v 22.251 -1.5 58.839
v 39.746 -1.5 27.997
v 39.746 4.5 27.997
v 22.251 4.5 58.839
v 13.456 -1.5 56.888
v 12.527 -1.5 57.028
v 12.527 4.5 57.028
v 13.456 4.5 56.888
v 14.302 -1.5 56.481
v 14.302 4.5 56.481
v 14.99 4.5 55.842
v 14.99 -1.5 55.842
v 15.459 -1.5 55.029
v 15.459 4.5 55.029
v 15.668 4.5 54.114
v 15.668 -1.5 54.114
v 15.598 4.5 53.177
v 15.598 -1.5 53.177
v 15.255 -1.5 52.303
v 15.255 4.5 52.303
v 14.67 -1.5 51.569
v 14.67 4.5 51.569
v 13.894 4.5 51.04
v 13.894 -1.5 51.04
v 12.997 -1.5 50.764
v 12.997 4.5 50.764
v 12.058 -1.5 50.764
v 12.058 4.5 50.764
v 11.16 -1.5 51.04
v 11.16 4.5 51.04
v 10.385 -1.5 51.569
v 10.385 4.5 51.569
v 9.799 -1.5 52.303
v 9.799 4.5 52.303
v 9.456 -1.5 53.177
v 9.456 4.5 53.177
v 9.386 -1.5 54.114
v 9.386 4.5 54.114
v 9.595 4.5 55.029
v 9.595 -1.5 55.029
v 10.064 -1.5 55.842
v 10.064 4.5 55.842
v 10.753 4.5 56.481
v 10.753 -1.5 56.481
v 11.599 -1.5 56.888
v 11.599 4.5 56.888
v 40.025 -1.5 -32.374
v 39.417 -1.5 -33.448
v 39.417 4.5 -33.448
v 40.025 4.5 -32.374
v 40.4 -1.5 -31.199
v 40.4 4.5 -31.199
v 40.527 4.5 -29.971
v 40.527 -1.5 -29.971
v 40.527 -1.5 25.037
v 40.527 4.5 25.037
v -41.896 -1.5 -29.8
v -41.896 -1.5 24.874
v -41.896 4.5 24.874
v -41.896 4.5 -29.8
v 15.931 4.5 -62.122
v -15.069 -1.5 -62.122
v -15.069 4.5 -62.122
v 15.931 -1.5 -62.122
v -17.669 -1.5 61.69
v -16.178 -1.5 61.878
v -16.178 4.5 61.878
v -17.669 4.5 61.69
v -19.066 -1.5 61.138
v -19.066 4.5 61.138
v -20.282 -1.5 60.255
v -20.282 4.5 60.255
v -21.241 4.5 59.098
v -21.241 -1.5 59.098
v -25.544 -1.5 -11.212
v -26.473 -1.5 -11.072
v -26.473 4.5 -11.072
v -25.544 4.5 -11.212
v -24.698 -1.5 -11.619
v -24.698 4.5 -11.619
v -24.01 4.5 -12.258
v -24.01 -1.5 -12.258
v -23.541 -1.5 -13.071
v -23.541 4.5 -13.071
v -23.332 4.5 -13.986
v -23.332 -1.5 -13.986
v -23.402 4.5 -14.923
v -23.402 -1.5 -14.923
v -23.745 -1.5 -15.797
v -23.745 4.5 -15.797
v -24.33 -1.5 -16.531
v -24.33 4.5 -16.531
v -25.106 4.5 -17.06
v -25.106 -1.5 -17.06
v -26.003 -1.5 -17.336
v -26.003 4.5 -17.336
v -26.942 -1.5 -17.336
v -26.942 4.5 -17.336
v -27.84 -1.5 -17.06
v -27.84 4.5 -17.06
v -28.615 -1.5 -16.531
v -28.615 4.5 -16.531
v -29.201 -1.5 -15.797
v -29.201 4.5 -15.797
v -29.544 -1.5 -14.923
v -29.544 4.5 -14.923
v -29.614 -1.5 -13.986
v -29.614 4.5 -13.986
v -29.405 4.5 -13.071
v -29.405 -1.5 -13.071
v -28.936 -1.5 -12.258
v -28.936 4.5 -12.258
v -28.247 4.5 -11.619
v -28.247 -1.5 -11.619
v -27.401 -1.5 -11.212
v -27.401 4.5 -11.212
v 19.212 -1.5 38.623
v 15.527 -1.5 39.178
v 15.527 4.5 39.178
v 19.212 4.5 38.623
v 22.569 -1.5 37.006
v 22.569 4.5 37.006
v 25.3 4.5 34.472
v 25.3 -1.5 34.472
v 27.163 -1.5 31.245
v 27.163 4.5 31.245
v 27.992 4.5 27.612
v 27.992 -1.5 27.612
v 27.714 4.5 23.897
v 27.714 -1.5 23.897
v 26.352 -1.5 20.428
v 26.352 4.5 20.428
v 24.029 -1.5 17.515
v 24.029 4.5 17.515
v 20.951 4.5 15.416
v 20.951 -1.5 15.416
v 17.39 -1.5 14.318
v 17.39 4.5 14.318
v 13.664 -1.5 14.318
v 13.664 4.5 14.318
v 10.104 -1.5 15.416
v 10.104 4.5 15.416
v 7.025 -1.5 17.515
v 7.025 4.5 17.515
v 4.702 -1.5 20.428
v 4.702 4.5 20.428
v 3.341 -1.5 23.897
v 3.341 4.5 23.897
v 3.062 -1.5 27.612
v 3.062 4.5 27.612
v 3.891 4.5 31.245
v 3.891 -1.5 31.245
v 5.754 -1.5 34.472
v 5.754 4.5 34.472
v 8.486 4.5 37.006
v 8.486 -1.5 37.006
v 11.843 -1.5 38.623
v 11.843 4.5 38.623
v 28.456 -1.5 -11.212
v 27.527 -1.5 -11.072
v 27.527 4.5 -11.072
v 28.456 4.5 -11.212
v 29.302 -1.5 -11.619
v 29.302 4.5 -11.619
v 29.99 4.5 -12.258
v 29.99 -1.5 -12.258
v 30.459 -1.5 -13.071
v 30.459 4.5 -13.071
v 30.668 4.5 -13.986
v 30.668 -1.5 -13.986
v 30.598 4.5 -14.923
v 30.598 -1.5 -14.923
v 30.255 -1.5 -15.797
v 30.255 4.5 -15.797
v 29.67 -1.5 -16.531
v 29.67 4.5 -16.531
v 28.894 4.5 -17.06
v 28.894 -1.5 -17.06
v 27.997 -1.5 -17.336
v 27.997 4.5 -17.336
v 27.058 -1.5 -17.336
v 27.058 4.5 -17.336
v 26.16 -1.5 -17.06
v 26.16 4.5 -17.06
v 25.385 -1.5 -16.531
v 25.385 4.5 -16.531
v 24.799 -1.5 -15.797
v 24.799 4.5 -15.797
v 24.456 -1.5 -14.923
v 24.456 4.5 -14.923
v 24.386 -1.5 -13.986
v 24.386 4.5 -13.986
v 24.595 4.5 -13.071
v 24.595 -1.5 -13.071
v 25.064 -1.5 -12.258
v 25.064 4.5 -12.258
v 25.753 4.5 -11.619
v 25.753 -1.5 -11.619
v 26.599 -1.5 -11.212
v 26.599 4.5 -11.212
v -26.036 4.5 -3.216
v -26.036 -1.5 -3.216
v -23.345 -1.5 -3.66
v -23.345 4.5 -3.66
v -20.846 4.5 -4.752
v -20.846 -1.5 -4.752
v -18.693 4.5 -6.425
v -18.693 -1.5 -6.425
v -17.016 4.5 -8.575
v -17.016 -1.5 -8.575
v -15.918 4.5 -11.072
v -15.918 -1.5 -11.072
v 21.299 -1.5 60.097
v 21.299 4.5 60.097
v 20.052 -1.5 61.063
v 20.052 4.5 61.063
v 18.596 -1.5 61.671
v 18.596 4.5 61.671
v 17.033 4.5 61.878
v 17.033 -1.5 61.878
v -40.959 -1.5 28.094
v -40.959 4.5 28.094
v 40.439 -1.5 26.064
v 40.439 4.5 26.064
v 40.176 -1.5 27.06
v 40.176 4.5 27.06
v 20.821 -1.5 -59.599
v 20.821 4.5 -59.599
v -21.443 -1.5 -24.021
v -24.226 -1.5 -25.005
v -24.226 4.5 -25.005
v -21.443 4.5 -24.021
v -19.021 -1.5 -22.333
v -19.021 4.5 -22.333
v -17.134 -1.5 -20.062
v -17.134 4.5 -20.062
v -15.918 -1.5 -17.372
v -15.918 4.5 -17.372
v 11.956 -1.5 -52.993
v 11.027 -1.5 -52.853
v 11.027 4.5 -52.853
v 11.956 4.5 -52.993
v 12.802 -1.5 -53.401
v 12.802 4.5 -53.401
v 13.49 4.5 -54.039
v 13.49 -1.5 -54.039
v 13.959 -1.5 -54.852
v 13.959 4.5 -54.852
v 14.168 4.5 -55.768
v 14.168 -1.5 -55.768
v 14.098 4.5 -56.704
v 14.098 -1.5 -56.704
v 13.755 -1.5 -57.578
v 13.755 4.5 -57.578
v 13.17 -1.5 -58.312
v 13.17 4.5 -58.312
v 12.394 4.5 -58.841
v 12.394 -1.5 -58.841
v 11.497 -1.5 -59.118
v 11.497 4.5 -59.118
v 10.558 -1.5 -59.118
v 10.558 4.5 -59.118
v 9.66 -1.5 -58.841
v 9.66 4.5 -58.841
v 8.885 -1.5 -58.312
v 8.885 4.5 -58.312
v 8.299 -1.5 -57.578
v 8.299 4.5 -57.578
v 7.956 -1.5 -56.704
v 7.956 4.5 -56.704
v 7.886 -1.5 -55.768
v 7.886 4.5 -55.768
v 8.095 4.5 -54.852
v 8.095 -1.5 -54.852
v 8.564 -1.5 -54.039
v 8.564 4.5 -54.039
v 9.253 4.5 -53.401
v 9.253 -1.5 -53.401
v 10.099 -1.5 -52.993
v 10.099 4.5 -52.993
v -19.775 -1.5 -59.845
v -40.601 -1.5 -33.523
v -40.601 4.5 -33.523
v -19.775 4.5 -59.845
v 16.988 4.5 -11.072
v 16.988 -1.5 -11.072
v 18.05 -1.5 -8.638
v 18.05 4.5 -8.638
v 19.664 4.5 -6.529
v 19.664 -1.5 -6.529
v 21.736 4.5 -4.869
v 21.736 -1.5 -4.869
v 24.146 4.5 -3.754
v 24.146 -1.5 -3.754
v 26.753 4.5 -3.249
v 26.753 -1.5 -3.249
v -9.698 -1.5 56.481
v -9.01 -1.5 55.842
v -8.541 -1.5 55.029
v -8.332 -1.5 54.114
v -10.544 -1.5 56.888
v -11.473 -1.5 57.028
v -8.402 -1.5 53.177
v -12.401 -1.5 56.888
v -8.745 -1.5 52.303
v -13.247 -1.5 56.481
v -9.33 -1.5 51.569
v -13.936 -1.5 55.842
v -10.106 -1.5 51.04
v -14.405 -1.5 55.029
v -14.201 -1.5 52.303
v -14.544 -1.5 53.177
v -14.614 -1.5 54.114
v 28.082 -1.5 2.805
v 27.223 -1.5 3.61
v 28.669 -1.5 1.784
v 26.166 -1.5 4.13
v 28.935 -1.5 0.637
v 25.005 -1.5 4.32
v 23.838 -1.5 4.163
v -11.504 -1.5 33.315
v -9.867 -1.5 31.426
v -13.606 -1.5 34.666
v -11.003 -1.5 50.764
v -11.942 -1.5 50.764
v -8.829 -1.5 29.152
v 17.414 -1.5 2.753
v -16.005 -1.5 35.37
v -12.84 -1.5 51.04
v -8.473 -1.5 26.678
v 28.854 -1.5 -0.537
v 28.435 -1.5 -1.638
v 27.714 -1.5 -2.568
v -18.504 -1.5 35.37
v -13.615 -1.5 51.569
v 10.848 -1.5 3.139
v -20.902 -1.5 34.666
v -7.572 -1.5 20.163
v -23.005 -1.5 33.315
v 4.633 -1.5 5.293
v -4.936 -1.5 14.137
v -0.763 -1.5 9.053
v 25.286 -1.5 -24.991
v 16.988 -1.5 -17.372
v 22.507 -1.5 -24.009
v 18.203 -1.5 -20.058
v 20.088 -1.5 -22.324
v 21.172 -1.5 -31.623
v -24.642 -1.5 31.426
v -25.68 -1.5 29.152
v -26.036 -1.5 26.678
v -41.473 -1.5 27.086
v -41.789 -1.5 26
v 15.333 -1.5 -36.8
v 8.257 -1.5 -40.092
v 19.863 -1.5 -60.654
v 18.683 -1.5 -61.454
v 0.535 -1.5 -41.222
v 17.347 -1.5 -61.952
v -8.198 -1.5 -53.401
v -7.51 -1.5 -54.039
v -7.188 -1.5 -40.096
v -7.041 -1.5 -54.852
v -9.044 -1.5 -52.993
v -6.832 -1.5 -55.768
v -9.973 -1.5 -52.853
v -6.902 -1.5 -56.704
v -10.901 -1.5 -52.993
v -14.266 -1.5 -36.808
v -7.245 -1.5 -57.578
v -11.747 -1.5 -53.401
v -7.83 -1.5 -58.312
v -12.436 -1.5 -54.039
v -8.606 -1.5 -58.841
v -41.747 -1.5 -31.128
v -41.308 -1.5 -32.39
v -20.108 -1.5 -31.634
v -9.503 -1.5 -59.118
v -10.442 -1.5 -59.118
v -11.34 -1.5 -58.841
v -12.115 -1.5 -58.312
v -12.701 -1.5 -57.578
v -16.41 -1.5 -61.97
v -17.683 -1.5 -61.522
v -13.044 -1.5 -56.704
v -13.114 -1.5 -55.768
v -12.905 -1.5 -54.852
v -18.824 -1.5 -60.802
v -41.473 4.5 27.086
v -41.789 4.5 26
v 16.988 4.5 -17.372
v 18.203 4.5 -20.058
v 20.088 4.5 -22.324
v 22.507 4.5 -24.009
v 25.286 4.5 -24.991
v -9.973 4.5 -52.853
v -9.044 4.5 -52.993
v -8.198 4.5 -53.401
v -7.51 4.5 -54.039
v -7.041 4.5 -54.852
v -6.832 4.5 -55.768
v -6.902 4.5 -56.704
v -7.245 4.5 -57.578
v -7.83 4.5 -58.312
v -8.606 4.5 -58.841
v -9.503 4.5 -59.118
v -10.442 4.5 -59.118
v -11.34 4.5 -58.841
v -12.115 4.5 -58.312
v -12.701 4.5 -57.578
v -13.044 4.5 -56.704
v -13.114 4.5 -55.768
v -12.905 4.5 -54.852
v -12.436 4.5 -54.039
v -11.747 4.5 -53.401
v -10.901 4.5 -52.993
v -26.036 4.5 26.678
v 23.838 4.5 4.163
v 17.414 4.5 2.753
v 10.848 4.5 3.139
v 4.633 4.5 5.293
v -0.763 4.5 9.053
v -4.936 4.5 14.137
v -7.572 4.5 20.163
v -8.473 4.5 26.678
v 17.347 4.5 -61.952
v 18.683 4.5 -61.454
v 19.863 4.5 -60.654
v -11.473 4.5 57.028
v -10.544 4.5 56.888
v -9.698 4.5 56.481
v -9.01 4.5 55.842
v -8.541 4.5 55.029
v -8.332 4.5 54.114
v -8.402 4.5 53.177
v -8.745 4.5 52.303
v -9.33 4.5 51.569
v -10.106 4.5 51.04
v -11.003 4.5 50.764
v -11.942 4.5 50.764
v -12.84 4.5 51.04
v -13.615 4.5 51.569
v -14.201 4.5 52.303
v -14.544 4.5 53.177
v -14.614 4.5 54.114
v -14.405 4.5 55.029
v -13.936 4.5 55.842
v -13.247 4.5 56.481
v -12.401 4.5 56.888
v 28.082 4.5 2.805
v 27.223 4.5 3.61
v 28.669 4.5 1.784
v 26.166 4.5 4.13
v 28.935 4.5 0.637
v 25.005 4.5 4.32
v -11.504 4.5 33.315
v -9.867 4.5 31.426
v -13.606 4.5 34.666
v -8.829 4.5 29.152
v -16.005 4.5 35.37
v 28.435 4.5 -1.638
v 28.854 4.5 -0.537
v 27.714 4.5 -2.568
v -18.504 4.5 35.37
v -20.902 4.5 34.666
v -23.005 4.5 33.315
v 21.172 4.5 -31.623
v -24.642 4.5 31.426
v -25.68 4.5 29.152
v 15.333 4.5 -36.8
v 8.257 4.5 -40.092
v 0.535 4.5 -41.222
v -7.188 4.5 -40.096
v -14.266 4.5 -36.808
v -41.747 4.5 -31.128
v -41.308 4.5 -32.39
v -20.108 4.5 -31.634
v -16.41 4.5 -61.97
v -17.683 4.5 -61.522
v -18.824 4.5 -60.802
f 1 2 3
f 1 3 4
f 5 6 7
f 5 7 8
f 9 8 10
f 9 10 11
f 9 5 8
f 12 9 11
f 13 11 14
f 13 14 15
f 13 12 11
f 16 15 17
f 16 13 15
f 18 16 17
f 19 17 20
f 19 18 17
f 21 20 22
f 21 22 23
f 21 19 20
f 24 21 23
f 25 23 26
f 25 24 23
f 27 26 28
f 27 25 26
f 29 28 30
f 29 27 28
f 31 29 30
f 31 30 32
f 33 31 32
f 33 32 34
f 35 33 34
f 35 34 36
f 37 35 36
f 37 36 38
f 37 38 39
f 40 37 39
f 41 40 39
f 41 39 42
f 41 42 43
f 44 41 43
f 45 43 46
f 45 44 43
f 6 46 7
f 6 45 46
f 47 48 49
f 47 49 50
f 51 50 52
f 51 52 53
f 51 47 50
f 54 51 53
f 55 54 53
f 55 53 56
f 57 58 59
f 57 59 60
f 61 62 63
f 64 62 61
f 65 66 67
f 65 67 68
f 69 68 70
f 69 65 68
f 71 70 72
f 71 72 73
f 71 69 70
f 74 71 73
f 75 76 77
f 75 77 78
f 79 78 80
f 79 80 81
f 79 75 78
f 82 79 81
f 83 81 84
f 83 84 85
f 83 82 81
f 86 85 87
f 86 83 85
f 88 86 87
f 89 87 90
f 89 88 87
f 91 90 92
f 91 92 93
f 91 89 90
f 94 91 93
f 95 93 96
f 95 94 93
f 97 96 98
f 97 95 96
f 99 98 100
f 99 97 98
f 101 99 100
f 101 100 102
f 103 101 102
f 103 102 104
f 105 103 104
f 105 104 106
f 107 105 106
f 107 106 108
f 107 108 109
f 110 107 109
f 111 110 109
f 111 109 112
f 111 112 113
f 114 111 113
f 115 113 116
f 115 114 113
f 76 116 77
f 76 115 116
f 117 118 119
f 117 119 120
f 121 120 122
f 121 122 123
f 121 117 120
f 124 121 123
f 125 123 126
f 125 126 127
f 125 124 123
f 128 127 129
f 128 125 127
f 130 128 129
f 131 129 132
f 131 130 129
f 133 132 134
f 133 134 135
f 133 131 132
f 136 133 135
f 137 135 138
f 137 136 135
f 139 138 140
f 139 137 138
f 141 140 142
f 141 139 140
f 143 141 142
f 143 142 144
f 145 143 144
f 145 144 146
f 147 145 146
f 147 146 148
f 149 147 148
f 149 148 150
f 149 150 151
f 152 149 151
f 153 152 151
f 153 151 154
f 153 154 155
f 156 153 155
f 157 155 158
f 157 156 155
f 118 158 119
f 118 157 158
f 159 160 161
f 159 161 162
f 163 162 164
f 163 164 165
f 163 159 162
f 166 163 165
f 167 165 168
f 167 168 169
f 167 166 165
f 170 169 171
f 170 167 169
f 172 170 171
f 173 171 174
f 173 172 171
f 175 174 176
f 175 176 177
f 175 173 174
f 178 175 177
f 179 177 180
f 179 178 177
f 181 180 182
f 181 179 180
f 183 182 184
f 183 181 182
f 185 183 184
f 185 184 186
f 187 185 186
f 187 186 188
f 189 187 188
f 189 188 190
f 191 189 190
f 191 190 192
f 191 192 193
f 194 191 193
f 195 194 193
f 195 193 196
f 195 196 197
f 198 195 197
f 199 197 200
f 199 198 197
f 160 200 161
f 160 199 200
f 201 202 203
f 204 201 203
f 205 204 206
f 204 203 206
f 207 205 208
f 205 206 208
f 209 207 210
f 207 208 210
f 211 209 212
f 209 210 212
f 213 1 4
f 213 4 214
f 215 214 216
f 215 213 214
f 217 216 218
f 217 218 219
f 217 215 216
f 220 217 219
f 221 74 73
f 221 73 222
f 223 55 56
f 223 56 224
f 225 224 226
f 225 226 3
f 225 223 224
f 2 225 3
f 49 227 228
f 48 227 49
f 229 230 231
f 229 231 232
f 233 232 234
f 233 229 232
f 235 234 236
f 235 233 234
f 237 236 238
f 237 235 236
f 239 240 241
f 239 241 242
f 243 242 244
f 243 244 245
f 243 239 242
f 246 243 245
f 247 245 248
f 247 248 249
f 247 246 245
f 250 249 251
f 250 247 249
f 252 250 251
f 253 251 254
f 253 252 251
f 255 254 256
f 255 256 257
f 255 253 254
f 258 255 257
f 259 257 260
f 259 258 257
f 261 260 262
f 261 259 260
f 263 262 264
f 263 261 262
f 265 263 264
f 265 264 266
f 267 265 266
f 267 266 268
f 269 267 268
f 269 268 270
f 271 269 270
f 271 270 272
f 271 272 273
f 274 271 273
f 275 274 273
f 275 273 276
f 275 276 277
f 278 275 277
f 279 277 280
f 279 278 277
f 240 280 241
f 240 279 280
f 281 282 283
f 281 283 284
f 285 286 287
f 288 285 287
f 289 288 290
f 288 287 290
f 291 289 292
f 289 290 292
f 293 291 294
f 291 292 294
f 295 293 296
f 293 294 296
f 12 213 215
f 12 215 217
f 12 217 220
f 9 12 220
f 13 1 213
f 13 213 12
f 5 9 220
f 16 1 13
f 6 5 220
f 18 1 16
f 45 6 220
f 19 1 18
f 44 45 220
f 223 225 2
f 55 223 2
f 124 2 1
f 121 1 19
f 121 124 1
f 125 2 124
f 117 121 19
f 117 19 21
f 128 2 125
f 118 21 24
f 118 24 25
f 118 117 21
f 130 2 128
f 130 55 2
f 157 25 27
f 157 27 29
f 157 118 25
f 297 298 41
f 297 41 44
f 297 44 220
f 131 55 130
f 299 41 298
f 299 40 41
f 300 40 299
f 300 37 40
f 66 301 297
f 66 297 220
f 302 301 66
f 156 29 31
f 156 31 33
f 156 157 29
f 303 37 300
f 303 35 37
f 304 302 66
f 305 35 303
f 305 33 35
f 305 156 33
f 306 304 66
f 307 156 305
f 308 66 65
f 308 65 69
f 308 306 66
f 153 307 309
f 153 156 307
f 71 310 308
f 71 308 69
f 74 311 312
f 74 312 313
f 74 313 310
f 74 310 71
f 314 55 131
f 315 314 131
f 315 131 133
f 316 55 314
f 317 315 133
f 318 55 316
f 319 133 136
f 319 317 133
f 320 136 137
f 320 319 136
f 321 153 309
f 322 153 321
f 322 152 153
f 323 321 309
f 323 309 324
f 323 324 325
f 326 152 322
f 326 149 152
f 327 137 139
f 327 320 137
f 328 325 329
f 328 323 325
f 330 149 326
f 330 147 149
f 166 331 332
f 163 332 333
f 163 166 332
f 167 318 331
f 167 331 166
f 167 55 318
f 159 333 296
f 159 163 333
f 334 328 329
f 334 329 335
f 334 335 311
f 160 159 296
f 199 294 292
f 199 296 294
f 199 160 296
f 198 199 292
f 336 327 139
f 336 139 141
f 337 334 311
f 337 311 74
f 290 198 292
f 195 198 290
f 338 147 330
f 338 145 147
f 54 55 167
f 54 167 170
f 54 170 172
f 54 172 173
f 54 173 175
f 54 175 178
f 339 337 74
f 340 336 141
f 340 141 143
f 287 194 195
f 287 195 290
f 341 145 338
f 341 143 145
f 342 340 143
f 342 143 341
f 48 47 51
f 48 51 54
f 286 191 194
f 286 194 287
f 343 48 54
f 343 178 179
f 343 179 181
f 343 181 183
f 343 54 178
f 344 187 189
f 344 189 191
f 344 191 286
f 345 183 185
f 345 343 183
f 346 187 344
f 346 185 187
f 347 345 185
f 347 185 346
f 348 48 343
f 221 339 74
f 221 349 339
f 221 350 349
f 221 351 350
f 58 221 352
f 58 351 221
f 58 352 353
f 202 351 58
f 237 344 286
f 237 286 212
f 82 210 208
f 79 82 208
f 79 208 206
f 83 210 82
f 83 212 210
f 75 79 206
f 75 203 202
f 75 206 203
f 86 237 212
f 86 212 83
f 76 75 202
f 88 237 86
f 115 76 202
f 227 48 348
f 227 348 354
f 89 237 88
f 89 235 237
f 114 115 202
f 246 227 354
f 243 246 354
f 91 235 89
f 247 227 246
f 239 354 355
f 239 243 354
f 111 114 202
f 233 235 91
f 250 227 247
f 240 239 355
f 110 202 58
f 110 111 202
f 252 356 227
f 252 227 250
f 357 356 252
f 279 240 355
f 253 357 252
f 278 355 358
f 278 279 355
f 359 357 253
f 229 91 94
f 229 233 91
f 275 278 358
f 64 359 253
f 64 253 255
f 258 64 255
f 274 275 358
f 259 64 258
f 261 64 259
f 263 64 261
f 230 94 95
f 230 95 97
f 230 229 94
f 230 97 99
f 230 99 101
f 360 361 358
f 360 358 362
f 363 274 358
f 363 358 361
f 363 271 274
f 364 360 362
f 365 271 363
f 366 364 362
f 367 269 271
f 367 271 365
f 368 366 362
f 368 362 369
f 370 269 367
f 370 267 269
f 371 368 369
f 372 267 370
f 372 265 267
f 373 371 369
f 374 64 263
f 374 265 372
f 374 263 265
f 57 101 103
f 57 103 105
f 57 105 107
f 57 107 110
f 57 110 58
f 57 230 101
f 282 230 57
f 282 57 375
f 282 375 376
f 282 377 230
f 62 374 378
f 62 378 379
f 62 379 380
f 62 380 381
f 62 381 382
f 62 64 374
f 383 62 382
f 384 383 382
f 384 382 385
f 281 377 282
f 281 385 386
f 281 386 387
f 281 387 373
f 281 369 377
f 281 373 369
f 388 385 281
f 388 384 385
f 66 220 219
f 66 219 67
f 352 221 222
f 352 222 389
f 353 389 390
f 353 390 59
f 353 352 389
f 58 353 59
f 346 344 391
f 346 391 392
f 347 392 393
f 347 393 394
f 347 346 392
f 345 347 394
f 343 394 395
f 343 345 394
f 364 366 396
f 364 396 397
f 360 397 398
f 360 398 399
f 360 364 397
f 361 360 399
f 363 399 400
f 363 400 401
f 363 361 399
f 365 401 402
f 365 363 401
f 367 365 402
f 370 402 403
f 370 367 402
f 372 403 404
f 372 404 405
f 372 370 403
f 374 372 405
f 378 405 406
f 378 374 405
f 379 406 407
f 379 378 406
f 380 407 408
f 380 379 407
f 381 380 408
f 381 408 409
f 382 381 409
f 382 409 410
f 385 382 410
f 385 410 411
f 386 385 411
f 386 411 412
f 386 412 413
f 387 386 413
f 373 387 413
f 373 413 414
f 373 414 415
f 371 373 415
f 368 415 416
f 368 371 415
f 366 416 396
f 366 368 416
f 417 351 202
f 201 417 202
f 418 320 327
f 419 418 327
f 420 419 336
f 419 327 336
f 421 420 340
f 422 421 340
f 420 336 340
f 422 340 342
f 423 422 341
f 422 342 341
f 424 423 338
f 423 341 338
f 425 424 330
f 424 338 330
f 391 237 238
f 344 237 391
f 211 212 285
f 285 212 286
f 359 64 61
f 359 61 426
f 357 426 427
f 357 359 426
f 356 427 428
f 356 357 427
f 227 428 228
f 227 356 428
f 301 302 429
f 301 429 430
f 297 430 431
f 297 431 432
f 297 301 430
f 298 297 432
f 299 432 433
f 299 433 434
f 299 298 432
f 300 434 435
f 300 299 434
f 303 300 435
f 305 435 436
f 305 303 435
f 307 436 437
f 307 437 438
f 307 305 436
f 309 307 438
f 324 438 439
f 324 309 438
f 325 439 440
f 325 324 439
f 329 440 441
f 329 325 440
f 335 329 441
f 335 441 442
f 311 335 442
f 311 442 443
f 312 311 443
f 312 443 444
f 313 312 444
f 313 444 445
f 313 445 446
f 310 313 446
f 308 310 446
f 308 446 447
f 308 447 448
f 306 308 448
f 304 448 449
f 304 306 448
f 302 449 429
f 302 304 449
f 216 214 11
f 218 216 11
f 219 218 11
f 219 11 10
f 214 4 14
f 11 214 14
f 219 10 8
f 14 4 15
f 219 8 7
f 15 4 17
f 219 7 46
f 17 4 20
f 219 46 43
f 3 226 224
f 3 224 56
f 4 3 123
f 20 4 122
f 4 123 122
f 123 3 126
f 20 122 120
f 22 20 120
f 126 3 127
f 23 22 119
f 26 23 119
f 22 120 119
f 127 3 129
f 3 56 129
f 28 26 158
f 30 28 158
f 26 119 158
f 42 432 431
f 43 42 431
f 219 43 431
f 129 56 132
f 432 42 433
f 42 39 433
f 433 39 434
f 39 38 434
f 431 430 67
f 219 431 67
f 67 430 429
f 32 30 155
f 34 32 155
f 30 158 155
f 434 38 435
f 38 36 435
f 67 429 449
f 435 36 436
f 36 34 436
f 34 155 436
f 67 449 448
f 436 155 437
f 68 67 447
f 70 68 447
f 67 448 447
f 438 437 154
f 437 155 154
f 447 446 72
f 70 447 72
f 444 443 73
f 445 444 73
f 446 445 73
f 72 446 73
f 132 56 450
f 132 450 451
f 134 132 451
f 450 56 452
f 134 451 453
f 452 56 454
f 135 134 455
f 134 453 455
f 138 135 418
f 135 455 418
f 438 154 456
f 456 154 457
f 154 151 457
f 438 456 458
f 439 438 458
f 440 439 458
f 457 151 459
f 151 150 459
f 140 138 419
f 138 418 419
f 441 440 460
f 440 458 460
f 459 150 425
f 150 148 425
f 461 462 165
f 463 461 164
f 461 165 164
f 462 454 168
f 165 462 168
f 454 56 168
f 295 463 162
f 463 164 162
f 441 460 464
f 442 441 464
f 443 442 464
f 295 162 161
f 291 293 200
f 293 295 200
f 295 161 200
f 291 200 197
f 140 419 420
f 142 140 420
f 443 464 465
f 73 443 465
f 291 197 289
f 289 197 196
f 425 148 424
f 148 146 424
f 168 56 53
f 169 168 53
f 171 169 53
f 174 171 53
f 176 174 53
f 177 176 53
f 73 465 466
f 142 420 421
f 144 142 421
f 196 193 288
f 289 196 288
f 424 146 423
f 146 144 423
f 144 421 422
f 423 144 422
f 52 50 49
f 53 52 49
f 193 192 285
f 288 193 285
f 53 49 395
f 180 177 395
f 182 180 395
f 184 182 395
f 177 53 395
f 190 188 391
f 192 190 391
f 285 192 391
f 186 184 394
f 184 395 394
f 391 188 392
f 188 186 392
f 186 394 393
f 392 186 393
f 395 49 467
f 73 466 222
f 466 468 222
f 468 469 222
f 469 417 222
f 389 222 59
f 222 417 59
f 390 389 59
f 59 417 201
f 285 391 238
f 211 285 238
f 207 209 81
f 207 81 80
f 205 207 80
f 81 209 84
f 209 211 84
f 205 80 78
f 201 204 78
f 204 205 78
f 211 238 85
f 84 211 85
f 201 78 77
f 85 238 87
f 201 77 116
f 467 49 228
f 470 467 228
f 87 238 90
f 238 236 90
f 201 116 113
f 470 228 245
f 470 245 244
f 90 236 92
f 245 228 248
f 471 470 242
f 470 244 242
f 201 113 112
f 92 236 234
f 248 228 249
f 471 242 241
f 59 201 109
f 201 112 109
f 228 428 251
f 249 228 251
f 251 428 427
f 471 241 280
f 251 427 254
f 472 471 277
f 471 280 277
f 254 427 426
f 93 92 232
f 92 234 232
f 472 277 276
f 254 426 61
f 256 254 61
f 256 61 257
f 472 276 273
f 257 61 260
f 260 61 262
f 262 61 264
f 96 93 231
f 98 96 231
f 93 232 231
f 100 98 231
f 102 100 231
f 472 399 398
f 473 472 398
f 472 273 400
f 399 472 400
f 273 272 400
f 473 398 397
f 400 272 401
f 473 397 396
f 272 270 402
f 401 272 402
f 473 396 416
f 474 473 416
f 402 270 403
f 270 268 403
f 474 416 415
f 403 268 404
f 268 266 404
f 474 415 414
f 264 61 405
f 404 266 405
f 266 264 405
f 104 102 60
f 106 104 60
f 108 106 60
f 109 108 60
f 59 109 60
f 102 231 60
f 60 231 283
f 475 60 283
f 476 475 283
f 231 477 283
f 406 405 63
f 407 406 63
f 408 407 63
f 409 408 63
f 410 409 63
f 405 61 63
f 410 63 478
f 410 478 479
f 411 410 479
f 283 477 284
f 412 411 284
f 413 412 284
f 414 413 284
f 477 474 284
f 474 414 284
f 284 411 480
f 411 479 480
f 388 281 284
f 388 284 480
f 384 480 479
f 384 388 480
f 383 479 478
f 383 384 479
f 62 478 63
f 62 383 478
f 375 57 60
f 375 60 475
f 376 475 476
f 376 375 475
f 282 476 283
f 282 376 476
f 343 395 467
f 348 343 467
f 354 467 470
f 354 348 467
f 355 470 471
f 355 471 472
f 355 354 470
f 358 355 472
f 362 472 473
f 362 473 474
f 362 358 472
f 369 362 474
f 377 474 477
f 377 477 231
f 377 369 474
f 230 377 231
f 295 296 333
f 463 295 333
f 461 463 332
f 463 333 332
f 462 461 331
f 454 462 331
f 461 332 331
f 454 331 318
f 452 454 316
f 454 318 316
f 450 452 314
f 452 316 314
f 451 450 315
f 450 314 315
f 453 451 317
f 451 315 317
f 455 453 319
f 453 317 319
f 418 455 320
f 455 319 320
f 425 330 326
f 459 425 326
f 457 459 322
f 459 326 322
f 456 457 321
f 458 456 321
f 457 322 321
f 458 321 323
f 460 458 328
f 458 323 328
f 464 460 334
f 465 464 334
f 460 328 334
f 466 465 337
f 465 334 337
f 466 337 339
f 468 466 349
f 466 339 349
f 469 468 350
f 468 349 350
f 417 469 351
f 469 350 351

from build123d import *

# Parameters (mm, degrees)
SKETCH1_R          = 6.25
SKETCH1_R_2        = 1.575
BASE_FLANGE1_DEPTH = 3
L_EK1_SCALE        = 2


# Sheet-metal steps are written as plain solids
with BuildPart() as part:
    # Sketch1 → Base-Flange1 (new body)
    with BuildSketch(Plane(origin=(0, 0, 0), x_dir=(1, 0, 0), z_dir=(0, 1, 0))):
        with BuildLine():
            Line((19.609421573, -14.059417906), (10.862109445, -29.480175346))
            ThreePointArc((10.862109445, -29.480175346), (9.762567662, -30.59234701), (8.252687872, -31))
            Line((8.252687872, -31), (-8.352599575, -31))
            ThreePointArc((-8.352599575, -31), (-9.796606082, -30.629609326), (-10.884048227, -29.609896806))
            Line((-10.884048227, -29.609896806), (-20.742852548, -14.107625594))
            ThreePointArc((-20.742852548, -14.107625594), (-21.091885276, -13.336076582), (-21.211403896, -12.497728788))
            Line((-21.211403896, -12.497728788), (-21.211403896, 14.839305313))
            ThreePointArc((-21.211403896, 14.839305313), (-21.044943633, 15.824725306), (-20.564035521, 16.700789784))
            Line((-20.564035521, 16.700789784), (-10.150833328, 29.861484472))
            ThreePointArc((-10.150833328, 29.861484472), (-9.105019706, 30.700412322), (-7.798201703, 31))
            Line((-7.798201703, 31), (7.702138241, 31))
            ThreePointArc((7.702138241, 31), (9.077698333, 30.666052219), (10.147014932, 29.738556288))
            Line((10.147014932, 29.738556288), (19.444876691, 16.663267527))
            ThreePointArc((19.444876691, 16.663267527), (19.857851472, 15.837226972), (20, 14.924711239))
            Line((20, 14.924711239), (20, -12.57924256))
            ThreePointArc((20, -12.57924256), (19.900712388, -13.344662472), (19.609421573, -14.059417906))
        make_face()
        with Locations(Location((7.5, -13.4, 0), (0, 0, 270))):
            Circle(SKETCH1_R, mode=Mode.SUBTRACT)
        with Locations(Location((6, -27, 0), (0, 0, 270))):
            Circle(SKETCH1_R_2, mode=Mode.SUBTRACT)
        with Locations(Location((-6, -27, 0), (0, 0, 270))):
            Circle(SKETCH1_R_2, mode=Mode.SUBTRACT)
        with Locations(Location((5.25, 27.940782939, 0), (0, 0, 270))):
            Circle(SKETCH1_R_2, mode=Mode.SUBTRACT)
        with Locations(Location((-5.25, 27.940782939, 0), (0, 0, 270))):
            Circle(SKETCH1_R_2, mode=Mode.SUBTRACT)
        with Locations(Location((13.5, 7.05, 0), (0, 0, 270))):
            Circle(SKETCH1_R_2, mode=Mode.SUBTRACT)
        with Locations(Location((-13.5, 7.05, 0), (0, 0, 270))):
            Circle(SKETCH1_R_2, mode=Mode.SUBTRACT)
        with BuildLine():
            Line((-13.281403896, 0), (-13.281403896, 1.54698652))
            ThreePointArc((-13.281403896, 1.54698652), (-10.122330587, 2.700024029), (-8.222660082, 5.475))
            Line((-8.222660082, 5.475), (8.230334451, 5.475))
            ThreePointArc((8.230334451, 5.475), (10.061414817, 2.757432943), (13.113110627, 1.563624456))
            ThreePointArc((13.113110627, 1.563624456), (14.07117407, -0.953003234), (11.655254401, -2.142386538))
            ThreePointArc((11.655254401, -2.142386538), (0.639353267, -3.554619032), (-4.5, -13.4))
            ThreePointArc((-4.5, -13.4), (-8.890701948, -17.790701948), (-13.281403896, -13.4))
            Line((-13.281403896, -13.4), (-13.281403896, 0))
        make_face(mode=Mode.SUBTRACT)
        with BuildLine():
            Line((-8.222660082, 8.625), (8.230334451, 8.625))
            ThreePointArc((8.230334451, 8.625), (9.780248168, 11.101351171), (12.37962963, 12.434679214))
            ThreePointArc((12.37962963, 12.434679214), (0.003755557, 20.549999478), (-12.376631792, 12.441566144))
            ThreePointArc((-12.376631792, 12.441566144), (-9.773901449, 11.105506282), (-8.222660082, 8.625))
        make_face(mode=Mode.SUBTRACT)
    extrude(amount=BASE_FLANGE1_DEPTH)


with BuildPart() as part_1:
    # Ölçek1: scaled about (-0.5271359, 1.5, 0.12162837)
    add(part.part.scale(L_EK1_SCALE).moved(Location((0.5271359, -1.5, -0.12162837))))


solid = part_1.part
